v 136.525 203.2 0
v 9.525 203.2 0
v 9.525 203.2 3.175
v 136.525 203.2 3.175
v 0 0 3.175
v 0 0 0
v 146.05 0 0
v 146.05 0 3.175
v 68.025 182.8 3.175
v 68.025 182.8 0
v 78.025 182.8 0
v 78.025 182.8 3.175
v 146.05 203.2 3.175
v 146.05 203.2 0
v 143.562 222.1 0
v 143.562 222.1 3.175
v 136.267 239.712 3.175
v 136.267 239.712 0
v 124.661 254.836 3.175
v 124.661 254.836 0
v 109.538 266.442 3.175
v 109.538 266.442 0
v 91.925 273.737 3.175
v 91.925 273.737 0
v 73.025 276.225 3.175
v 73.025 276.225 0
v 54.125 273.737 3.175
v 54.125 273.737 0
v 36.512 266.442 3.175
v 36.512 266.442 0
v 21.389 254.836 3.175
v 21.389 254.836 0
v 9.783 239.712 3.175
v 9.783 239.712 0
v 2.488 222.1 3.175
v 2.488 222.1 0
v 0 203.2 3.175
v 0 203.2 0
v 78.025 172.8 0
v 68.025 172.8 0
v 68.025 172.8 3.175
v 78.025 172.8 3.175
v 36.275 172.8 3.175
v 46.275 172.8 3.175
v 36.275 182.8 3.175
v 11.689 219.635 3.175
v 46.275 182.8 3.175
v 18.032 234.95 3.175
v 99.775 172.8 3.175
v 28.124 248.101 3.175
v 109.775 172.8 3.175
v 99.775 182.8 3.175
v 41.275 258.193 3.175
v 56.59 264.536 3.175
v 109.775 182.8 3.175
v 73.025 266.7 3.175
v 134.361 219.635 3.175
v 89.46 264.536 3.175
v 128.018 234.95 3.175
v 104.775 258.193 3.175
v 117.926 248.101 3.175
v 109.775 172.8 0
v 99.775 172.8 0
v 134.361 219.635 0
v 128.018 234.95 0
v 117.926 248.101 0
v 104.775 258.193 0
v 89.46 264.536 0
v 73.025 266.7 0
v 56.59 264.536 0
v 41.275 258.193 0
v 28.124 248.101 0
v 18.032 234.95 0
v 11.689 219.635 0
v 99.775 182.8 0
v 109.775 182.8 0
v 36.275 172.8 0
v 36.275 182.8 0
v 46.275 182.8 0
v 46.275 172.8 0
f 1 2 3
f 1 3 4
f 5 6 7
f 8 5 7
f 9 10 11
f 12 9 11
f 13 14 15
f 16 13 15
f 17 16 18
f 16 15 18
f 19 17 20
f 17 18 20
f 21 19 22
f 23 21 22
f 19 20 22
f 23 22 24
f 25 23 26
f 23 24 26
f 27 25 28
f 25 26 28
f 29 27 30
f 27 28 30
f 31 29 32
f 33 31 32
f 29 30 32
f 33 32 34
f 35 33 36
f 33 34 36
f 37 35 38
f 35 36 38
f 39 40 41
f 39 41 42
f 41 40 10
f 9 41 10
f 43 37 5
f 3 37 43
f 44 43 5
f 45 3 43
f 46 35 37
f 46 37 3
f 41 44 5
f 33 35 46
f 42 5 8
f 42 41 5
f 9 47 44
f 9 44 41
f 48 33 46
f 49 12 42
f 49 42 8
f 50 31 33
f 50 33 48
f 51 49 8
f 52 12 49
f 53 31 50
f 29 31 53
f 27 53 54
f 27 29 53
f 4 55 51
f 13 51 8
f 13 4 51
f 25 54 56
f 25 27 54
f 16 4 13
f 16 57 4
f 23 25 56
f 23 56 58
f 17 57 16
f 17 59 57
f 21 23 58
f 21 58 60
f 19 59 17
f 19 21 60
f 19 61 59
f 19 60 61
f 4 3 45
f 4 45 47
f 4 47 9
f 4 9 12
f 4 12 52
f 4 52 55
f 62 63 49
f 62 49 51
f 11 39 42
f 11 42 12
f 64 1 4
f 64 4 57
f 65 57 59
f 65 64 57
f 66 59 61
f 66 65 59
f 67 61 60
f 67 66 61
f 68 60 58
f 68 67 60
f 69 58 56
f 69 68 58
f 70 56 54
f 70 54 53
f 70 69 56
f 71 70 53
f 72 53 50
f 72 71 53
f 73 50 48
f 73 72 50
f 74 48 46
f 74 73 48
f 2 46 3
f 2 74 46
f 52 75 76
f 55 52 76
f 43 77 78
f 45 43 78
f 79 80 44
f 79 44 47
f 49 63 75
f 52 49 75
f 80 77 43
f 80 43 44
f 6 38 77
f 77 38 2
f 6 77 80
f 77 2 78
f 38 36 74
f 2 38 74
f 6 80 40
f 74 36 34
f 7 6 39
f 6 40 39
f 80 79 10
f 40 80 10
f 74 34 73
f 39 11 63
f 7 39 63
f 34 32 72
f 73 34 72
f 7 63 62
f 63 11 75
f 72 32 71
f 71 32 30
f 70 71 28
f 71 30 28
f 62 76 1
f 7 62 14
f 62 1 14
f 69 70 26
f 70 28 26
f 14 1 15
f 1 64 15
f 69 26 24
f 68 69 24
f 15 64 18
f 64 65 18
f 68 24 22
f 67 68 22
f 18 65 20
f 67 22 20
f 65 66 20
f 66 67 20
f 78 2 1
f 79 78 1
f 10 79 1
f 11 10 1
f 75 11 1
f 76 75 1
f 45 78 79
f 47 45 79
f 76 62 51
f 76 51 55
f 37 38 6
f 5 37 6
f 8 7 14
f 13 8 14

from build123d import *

# Parameters (mm, degrees)
SKETCH2_W           = 10
SKETCH2_H           = 10
BOSS_EXTRUDE5_DEPTH = 3.175


with BuildPart() as part:
    # Sketch2 → Boss-Extrude5 (new body)
    with BuildSketch(Plane.XY):
        with BuildLine():
            Line((0, 0), (146.05, 0))
            Line((146.05, 0), (146.05, 203.2))
            ThreePointArc((146.05, 203.2), (73.025, 276.225), (0, 203.2))
            Line((0, 203.2), (0, 0))
        make_face()
        with BuildLine():
            Line((9.525, 203.2), (136.525, 203.2))
            ThreePointArc((136.525, 203.2), (73.025, 266.7), (9.525, 203.2))
        make_face(mode=Mode.SUBTRACT)
        with Locations((41.275, 177.8)):
            Rectangle(SKETCH2_W, SKETCH2_H, mode=Mode.SUBTRACT)
        with Locations((73.025, 177.8)):
            Rectangle(SKETCH2_W, SKETCH2_H, mode=Mode.SUBTRACT)
        with Locations((104.775, 177.8)):
            Rectangle(SKETCH2_W, SKETCH2_H, mode=Mode.SUBTRACT)
    extrude(amount=BOSS_EXTRUDE5_DEPTH)


solid = part.part
